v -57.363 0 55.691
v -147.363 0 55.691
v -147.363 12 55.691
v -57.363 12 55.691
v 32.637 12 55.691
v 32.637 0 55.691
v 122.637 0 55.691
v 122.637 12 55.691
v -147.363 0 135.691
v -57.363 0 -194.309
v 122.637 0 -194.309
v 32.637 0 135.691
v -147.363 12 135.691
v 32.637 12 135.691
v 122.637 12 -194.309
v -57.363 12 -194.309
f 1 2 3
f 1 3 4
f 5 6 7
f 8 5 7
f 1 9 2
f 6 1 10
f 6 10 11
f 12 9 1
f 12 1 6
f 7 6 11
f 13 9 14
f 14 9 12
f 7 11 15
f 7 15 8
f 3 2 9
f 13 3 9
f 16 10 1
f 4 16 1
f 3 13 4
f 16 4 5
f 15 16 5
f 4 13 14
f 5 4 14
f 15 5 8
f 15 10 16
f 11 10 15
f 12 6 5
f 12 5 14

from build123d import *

# Parameters (mm, degrees)
F0_W     = 180
F0_H     = 250
F1_DEPTH = 12
F2_W     = 180
F2_H     = 80
F3_DEPTH = 12


with BuildPart() as f1:
    # F0 (on Front) → F1 (new body)
    with BuildSketch(Plane.XZ):
        with Locations((32.637028, -69.309338)):
            Rectangle(F0_W, F0_H)
    extrude(amount=-F1_DEPTH)

    # F2 (on face) → F3 (join)
    with BuildSketch(Plane.XZ):
        with Locations((-57.362972, 95.690662)):
            Rectangle(F2_W, F2_H)
    extrude(amount=-F3_DEPTH)


solid = f1.part
